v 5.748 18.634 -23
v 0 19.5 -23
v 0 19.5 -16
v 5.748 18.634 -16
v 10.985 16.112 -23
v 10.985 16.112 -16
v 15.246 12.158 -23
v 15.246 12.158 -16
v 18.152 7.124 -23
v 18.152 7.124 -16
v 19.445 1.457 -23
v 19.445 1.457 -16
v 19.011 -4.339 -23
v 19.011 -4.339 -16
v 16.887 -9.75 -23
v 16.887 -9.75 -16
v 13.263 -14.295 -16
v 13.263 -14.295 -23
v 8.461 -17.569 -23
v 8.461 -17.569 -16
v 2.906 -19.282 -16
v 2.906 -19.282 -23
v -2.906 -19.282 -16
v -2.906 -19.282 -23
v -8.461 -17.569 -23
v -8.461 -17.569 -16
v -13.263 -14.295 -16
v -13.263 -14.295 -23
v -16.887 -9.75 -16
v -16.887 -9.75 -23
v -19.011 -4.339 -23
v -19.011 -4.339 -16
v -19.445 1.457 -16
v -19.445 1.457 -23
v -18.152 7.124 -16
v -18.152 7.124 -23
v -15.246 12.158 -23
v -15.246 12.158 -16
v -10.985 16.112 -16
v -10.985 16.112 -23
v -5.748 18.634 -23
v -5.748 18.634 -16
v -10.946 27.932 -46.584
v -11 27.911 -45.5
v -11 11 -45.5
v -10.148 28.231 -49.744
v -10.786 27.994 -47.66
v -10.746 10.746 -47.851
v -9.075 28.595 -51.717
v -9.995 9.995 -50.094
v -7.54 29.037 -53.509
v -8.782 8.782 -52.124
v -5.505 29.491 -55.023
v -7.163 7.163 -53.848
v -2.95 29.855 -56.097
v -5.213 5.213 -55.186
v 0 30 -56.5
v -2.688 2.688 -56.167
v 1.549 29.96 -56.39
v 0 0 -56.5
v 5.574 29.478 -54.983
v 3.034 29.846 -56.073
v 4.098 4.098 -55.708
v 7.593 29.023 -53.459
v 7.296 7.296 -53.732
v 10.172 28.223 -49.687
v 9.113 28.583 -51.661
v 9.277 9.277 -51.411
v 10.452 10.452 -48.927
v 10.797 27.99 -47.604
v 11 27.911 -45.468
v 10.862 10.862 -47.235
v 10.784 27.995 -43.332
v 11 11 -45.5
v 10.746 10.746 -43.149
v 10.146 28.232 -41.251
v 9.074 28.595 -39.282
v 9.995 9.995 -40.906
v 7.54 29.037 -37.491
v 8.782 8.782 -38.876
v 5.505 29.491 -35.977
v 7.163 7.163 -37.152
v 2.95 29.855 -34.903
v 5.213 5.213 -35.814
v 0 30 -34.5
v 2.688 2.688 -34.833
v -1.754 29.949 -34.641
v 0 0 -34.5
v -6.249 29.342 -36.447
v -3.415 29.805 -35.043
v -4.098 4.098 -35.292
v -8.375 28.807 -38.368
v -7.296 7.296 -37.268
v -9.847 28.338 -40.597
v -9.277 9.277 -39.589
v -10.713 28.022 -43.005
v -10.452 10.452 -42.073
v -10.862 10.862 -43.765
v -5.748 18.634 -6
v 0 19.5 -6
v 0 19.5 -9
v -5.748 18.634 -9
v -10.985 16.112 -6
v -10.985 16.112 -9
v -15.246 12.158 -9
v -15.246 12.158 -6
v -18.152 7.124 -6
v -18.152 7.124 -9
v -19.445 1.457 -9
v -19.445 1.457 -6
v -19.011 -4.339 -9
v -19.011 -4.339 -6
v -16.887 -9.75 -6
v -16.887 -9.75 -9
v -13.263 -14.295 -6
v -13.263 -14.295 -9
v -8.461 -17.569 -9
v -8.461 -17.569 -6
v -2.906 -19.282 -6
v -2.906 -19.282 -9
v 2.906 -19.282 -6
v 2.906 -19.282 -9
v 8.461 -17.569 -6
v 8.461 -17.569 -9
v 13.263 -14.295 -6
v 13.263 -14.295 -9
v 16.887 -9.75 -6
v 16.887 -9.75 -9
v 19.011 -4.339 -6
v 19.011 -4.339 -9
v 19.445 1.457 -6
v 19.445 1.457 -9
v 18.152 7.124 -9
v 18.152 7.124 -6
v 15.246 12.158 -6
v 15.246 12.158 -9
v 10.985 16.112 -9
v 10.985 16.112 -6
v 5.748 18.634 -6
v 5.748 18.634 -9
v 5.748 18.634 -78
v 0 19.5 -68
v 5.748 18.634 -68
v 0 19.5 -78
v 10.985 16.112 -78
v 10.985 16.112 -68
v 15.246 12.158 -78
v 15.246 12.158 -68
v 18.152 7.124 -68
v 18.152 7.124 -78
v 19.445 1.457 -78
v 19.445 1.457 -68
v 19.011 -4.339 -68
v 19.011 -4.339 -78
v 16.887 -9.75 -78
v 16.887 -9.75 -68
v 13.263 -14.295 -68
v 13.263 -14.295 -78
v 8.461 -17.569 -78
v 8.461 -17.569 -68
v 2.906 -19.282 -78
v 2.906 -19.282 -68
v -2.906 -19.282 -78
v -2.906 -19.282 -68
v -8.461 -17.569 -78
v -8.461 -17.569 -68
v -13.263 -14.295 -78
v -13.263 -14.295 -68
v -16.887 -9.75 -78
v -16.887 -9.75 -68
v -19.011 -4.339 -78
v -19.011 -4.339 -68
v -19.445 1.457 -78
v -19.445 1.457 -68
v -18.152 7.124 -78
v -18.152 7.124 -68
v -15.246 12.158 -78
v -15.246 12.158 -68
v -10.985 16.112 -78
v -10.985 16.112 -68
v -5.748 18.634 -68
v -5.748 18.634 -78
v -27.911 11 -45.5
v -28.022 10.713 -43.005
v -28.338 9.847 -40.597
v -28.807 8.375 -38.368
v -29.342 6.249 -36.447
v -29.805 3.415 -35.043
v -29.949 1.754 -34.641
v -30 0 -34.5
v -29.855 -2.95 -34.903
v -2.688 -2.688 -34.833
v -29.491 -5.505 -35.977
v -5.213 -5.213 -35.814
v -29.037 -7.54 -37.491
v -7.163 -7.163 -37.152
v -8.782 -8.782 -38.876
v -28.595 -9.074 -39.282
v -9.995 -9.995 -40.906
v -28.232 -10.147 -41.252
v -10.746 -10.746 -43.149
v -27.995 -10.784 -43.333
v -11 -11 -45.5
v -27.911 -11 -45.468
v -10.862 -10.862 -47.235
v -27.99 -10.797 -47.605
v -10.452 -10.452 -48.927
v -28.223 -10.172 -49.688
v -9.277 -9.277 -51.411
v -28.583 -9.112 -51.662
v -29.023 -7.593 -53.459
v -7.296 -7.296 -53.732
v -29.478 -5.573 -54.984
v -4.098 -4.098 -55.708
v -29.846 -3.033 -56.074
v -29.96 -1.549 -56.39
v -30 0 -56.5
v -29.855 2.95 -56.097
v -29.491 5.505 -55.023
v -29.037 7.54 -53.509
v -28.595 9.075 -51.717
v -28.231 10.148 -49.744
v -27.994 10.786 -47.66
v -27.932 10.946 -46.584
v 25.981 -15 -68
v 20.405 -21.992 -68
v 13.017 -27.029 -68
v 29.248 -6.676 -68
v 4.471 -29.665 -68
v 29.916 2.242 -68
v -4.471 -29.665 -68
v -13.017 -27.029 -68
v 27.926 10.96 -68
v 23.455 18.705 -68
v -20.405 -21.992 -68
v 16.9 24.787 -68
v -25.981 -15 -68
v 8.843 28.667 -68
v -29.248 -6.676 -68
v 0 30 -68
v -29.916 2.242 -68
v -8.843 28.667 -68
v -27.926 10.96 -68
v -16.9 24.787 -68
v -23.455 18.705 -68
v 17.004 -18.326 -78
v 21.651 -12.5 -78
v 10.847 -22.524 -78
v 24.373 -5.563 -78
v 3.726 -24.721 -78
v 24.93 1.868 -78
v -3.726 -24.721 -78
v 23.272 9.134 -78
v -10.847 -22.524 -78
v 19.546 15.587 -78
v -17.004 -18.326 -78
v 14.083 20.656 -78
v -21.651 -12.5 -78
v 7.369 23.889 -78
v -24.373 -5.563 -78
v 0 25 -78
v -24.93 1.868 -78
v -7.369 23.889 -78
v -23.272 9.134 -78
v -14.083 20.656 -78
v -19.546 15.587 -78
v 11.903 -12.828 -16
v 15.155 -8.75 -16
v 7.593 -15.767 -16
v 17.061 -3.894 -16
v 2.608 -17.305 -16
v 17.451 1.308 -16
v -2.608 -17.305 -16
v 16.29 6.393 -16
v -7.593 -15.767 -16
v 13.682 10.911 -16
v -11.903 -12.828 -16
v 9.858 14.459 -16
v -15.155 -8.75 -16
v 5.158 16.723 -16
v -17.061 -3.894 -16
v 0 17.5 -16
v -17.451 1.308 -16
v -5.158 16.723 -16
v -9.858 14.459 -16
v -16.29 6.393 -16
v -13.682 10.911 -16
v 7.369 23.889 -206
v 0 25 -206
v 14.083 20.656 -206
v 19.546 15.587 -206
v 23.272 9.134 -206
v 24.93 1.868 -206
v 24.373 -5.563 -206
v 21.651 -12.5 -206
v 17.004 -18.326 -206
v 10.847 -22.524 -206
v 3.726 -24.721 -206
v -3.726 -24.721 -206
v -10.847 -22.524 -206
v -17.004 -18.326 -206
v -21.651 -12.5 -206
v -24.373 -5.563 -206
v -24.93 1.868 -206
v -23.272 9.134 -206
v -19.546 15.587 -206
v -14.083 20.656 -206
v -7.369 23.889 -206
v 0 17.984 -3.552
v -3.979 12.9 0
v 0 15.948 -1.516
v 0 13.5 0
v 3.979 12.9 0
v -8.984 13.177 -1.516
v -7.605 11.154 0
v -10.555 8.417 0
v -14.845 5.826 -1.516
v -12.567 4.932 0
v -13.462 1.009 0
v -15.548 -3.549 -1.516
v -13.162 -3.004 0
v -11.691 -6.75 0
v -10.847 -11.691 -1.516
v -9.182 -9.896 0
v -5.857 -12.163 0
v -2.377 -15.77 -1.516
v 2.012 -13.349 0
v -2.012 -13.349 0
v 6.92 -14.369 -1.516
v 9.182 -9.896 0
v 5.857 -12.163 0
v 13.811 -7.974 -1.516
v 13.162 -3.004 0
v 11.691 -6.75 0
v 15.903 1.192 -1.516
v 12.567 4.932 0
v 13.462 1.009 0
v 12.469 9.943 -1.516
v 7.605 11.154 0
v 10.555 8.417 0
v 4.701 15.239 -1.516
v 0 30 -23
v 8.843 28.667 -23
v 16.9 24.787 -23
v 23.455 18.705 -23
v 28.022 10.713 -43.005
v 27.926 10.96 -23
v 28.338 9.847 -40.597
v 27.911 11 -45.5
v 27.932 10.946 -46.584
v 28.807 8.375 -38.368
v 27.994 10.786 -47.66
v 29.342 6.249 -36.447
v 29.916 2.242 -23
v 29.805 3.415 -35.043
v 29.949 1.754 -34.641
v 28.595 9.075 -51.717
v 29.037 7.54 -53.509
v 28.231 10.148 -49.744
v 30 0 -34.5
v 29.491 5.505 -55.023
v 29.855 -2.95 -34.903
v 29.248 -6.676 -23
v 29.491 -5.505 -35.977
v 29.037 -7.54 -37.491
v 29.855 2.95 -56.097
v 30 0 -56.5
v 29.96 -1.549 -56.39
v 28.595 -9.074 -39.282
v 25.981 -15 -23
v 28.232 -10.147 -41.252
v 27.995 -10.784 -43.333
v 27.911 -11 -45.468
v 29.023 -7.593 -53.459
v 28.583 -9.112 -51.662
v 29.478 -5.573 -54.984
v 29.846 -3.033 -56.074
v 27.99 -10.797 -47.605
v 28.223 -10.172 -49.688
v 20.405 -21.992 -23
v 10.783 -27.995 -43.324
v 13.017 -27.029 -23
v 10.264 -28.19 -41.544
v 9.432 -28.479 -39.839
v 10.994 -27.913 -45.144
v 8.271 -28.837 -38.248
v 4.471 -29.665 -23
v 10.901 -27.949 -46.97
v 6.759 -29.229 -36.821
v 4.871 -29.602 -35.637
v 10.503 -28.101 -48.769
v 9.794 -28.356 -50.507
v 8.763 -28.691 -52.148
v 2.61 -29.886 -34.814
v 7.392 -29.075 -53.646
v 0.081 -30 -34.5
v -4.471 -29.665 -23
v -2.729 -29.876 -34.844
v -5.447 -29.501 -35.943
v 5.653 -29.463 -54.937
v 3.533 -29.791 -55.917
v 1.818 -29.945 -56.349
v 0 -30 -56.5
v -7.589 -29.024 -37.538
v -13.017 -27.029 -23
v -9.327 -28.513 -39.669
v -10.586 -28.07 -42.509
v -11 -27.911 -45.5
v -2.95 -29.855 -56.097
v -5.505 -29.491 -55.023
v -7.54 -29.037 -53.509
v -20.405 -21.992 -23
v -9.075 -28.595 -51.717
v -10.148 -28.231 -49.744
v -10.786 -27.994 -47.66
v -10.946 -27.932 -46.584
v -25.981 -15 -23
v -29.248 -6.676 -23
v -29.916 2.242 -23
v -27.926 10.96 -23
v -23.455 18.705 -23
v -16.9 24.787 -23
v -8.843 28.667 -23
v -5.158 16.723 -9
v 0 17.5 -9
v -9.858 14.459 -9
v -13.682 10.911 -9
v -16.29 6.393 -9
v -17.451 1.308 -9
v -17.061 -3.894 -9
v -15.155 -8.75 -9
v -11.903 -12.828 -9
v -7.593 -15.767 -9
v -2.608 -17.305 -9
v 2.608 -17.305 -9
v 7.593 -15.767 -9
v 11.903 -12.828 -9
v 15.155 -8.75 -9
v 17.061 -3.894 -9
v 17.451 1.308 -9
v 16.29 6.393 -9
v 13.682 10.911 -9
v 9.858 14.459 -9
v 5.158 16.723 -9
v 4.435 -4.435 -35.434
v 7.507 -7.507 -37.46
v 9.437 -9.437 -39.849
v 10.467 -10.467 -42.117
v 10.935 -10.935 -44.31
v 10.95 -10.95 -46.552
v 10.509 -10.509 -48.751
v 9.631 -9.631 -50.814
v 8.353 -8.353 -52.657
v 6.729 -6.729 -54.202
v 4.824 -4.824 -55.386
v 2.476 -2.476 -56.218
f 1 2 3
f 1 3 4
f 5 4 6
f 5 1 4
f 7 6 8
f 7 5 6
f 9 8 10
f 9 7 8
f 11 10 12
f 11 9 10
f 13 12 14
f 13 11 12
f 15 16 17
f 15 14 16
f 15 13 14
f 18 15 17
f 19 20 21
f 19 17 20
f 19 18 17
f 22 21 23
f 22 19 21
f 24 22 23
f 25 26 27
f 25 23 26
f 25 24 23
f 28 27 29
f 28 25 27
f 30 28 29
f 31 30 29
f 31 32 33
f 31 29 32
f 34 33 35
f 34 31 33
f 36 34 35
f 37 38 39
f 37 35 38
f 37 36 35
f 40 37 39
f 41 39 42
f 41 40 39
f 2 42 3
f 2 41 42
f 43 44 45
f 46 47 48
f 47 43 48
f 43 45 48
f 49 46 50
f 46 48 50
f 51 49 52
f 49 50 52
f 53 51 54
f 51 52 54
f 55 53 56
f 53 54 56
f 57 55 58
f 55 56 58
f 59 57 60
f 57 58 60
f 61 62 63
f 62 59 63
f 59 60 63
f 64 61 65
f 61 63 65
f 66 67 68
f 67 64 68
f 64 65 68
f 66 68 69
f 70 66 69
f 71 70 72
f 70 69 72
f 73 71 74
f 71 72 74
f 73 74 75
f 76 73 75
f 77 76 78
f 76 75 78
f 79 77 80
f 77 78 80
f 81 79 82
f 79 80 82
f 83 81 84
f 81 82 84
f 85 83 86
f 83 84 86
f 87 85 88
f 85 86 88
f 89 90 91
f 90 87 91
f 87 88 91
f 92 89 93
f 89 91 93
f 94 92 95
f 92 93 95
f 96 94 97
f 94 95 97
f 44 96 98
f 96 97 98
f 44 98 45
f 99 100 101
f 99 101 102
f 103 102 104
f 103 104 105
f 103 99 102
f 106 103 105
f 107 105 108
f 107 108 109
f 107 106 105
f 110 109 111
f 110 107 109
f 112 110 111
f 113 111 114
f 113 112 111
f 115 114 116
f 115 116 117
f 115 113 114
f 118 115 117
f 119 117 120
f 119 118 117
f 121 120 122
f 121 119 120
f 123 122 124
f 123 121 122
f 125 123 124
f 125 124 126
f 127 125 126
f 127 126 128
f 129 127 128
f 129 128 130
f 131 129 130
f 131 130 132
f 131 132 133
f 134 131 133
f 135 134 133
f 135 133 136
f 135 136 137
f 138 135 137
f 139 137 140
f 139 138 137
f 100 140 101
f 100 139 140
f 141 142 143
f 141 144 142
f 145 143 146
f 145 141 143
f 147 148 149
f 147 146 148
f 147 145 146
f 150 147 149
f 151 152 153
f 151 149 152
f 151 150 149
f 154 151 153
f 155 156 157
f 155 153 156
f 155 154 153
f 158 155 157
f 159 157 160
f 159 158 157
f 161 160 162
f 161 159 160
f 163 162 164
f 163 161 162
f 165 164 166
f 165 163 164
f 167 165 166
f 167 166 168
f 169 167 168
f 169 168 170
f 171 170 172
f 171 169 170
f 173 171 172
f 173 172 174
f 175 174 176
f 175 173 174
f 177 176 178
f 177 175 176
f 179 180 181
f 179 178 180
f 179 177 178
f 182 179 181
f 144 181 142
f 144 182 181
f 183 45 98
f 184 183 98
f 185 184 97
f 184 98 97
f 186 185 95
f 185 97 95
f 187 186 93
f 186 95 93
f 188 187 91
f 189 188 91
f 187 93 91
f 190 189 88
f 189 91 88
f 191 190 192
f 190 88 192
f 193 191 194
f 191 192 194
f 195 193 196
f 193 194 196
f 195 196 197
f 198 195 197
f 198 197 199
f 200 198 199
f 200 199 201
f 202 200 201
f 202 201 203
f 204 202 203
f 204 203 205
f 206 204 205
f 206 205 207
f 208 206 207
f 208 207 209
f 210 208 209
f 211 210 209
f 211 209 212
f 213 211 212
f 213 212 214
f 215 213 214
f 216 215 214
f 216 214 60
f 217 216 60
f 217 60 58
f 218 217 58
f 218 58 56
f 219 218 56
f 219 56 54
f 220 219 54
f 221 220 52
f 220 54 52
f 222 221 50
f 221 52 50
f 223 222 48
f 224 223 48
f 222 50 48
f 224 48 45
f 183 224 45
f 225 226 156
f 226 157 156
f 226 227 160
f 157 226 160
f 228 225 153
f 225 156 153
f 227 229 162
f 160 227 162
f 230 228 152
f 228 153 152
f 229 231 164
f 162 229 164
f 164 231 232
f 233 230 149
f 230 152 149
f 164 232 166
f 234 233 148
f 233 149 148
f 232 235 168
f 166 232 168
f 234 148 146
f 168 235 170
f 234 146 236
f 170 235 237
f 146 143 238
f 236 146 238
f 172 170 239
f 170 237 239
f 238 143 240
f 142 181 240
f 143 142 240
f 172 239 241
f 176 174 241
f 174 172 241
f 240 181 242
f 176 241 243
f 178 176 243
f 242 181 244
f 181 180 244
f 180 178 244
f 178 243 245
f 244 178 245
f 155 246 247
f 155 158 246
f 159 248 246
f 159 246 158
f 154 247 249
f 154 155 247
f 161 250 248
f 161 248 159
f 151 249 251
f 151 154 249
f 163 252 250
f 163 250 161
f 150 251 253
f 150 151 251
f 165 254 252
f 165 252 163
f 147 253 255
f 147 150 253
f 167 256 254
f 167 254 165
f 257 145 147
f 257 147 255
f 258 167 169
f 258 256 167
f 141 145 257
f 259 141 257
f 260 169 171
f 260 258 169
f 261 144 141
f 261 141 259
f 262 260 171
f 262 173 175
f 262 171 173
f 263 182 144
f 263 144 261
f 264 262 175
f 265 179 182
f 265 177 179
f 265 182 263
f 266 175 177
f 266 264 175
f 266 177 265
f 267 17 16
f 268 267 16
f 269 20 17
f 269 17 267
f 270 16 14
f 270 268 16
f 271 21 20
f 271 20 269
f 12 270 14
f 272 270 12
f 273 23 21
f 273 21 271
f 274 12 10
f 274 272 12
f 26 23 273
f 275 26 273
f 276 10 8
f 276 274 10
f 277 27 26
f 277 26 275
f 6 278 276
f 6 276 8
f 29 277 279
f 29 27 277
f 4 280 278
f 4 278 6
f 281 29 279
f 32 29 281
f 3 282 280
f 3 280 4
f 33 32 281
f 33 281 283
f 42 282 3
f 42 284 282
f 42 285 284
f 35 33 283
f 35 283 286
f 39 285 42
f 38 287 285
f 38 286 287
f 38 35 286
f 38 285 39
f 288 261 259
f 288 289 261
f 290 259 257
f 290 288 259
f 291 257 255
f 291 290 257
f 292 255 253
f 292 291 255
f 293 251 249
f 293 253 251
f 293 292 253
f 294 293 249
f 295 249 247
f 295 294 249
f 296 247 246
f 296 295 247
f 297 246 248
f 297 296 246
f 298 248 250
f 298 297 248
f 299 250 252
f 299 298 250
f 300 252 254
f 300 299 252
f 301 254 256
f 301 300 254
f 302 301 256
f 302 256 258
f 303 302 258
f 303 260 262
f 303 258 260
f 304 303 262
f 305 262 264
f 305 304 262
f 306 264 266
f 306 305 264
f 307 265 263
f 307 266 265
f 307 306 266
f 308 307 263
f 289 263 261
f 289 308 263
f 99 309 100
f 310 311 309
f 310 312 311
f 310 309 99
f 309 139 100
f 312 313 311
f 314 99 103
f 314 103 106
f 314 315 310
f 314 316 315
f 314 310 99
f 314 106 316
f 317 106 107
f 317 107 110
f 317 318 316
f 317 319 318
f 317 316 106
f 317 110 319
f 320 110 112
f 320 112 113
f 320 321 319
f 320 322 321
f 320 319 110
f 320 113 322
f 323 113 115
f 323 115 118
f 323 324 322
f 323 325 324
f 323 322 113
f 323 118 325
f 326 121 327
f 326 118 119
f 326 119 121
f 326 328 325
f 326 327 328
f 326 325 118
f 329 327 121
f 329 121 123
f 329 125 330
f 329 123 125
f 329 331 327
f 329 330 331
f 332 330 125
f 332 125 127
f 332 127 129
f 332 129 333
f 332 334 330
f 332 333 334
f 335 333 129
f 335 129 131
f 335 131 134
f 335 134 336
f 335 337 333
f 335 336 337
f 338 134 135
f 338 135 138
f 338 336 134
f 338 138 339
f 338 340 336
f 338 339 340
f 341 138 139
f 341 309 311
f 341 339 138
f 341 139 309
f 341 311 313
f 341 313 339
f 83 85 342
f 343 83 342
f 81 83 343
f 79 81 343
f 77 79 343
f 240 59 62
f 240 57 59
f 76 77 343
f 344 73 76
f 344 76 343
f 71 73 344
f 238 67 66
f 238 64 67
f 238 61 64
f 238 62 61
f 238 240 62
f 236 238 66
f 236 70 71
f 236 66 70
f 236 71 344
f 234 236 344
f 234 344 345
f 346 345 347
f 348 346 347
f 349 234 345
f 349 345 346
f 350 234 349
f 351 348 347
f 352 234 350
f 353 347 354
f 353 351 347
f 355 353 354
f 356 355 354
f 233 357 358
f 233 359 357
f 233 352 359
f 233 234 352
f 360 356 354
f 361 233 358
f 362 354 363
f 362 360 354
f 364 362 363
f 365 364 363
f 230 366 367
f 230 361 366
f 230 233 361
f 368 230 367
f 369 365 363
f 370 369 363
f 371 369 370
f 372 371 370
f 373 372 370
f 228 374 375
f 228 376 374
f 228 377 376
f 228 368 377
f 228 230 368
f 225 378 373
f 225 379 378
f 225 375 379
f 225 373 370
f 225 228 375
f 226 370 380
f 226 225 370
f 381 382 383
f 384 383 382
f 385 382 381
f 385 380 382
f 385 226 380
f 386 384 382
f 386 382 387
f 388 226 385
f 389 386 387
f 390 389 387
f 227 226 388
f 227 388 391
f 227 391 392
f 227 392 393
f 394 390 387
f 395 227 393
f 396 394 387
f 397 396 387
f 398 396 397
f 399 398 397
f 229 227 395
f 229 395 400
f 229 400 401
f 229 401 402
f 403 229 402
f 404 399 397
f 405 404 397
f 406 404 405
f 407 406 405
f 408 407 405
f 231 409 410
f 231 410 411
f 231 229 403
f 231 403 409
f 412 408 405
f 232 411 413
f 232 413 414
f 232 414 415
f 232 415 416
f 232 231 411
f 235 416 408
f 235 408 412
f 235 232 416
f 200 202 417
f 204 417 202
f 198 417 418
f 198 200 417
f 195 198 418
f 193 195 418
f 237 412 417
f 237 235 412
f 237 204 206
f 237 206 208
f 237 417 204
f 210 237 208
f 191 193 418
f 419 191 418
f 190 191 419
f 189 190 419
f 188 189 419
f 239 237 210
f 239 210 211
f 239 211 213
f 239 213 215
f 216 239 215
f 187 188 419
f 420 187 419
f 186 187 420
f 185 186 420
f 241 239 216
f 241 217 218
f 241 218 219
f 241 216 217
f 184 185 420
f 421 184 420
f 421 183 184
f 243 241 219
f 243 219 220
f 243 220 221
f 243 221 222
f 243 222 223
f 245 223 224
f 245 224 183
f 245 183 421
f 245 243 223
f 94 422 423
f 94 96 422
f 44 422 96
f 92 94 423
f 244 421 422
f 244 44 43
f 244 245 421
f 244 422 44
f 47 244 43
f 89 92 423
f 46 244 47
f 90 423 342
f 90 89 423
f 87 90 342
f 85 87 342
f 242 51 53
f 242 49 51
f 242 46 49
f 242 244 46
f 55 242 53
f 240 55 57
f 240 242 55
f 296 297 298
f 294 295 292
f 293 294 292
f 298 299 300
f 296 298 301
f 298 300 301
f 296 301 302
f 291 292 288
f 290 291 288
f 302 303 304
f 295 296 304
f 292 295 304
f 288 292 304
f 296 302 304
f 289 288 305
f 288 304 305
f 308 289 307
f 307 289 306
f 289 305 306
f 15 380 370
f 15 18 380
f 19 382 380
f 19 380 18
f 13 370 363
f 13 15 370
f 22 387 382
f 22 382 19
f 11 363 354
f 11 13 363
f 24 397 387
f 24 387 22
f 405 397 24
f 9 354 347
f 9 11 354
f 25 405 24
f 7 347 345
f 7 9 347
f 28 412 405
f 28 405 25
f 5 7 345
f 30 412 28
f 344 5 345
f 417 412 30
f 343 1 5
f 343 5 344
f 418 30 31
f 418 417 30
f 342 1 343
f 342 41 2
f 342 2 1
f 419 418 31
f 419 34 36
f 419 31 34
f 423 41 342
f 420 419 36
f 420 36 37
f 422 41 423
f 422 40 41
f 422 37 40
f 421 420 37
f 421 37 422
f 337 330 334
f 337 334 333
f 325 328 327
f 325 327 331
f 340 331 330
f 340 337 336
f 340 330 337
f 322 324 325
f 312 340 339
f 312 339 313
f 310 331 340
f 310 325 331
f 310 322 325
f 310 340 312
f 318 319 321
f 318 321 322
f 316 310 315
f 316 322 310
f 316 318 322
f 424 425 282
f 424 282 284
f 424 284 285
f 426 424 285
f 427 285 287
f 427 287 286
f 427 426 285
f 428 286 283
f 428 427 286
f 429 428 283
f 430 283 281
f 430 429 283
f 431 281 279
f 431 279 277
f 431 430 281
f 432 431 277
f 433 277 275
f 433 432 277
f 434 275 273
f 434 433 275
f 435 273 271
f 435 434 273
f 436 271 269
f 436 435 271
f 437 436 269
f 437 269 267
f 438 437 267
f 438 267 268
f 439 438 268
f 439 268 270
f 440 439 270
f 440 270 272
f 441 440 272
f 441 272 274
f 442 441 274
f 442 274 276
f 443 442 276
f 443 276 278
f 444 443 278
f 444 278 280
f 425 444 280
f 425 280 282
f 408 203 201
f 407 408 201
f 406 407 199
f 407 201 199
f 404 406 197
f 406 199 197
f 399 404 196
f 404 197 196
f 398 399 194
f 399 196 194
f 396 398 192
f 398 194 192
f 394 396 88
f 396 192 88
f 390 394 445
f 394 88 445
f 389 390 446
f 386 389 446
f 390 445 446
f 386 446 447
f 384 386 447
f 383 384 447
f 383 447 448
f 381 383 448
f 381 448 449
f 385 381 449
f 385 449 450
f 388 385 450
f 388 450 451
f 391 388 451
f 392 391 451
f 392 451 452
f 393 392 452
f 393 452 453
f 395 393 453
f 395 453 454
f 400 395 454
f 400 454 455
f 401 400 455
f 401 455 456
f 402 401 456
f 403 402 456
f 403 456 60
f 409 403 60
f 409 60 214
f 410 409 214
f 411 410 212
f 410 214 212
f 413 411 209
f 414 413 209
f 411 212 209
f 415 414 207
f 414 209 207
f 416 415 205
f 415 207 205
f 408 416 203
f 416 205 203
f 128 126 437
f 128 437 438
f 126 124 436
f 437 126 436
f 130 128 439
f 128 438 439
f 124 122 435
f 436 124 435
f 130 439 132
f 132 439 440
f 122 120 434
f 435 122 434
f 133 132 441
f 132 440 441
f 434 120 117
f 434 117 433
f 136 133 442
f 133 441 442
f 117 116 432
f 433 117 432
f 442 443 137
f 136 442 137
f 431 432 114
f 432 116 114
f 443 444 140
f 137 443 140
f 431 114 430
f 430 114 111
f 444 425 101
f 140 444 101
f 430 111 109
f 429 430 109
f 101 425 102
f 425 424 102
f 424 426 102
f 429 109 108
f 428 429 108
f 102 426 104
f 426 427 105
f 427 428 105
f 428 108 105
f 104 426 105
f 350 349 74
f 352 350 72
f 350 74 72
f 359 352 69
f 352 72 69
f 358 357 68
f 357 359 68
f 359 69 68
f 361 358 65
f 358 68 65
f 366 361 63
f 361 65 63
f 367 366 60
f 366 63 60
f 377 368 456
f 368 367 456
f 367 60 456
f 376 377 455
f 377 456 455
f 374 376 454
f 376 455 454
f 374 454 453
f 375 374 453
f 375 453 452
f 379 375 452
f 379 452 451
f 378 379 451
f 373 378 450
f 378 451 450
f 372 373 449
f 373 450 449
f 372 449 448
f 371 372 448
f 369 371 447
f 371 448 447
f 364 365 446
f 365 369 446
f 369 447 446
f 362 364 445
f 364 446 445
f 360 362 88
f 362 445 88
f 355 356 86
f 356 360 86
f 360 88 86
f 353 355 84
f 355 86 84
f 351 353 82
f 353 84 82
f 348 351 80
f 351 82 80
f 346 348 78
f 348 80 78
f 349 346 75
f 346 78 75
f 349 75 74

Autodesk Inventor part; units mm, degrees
ref_plane "YZ Plane" through (0, 0, 0) normal (1, 0, 0) x (0, 1, 0)
ref_plane "XZ Plane" through (0, 0, 0) normal (0, 1, 0) x (-1, 0, 0)
ref_plane "XY Plane" through (0, 0, 0) normal (0, 0, 1) x (1, 0, 0)
sketch "草图1" plane through (0, 0, 0) normal (1, 0, 0) x (0, 1, 0)
  line L0 (19.5, -23) -> (30, -23)
  line L1 (30, -23) -> (30, -68)
  line L2 (30, -68) -> (19.5, -68)
  line L3 (19.5, -68) -> (19.5, -78)
  line L4 (19.5, -78) -> (25, -78)
  line L5 (25, -78) -> (25, -206)
  line L6 (25, -206) -> (0, -206)
  line L7 (0, -206) -> (0, 0)
  line L8 (17.5, -16) -> (17.5, -9)
  line L9 (17.5, -9) -> (19.5, -9)
  line L10 (17.5, -16) -> (19.5, -16)
  line L11 (19.5, -16) -> (19.5, -23)
  line L12 (19.5, -23) -> (19.5, -6)
  line L13 (0, 0) -> (13.5, 0)
  arc A0 (19.5, -6) -> (13.5, 0) centre (8.1859, -11.3141) ccw
  dimension "d2" = 10.5
  dimension "d3" = 45
  dimension "d4" = 10.5
  dimension "d5" = 10
  dimension "d6" = 5.5
  dimension "d7" = 128
  dimension "d10" = 7
  dimension "d11" = 17
  dimension "d14" = 13.5
  dimension "d15" = 25
revolve "旋转1" add sketch "草图1" angle 360 about axis through (0, 0, -206) along (0, 0, 1) contours L0 L1 L2 L3 L4 L5 L6 L7 L13 A0 L12 L9 L8 L10 L11
sketch "草图2" plane through (0, 0, 0) normal (0, 1, 0) x (-1, 0, 0)
  line L0 (-19.5, -68) -> (19.5, -68) projected
  line L1 (0, -68) -> (0, -45.5)
  circle A0 centre (0, -45.5) radius 11
  point P0 (0, 0)
  dimension "d17" = 22.5
  dimension "d18" = 22
extrude "拉伸1" cut sketch "草图2" along normal blind 100 and the other way blind 100
thread "螺纹1" size "M50x4" class "6g" standard "ANSI Metric M Profile" full length
sketch "草图3" plane through (0, 0, 0) normal (1, 0, 0) x (0, 1, 0)
  line L0 (-19.5, -68) -> (19.5, -68) projected
  line L1 (0, -68) -> (0, -45.5)
  circle A0 centre (0, -45.5) radius 11
  line L2 (-30, -34.5) -> (30, -34.5) projected
  point P0 (0, 0)
  dimension "d25" = 22.5
  dimension "d26" = 22
extrude "拉伸2" cut sketch "草图3" along normal blind 100 and the other way blind 50
properties part number "螺杆"
